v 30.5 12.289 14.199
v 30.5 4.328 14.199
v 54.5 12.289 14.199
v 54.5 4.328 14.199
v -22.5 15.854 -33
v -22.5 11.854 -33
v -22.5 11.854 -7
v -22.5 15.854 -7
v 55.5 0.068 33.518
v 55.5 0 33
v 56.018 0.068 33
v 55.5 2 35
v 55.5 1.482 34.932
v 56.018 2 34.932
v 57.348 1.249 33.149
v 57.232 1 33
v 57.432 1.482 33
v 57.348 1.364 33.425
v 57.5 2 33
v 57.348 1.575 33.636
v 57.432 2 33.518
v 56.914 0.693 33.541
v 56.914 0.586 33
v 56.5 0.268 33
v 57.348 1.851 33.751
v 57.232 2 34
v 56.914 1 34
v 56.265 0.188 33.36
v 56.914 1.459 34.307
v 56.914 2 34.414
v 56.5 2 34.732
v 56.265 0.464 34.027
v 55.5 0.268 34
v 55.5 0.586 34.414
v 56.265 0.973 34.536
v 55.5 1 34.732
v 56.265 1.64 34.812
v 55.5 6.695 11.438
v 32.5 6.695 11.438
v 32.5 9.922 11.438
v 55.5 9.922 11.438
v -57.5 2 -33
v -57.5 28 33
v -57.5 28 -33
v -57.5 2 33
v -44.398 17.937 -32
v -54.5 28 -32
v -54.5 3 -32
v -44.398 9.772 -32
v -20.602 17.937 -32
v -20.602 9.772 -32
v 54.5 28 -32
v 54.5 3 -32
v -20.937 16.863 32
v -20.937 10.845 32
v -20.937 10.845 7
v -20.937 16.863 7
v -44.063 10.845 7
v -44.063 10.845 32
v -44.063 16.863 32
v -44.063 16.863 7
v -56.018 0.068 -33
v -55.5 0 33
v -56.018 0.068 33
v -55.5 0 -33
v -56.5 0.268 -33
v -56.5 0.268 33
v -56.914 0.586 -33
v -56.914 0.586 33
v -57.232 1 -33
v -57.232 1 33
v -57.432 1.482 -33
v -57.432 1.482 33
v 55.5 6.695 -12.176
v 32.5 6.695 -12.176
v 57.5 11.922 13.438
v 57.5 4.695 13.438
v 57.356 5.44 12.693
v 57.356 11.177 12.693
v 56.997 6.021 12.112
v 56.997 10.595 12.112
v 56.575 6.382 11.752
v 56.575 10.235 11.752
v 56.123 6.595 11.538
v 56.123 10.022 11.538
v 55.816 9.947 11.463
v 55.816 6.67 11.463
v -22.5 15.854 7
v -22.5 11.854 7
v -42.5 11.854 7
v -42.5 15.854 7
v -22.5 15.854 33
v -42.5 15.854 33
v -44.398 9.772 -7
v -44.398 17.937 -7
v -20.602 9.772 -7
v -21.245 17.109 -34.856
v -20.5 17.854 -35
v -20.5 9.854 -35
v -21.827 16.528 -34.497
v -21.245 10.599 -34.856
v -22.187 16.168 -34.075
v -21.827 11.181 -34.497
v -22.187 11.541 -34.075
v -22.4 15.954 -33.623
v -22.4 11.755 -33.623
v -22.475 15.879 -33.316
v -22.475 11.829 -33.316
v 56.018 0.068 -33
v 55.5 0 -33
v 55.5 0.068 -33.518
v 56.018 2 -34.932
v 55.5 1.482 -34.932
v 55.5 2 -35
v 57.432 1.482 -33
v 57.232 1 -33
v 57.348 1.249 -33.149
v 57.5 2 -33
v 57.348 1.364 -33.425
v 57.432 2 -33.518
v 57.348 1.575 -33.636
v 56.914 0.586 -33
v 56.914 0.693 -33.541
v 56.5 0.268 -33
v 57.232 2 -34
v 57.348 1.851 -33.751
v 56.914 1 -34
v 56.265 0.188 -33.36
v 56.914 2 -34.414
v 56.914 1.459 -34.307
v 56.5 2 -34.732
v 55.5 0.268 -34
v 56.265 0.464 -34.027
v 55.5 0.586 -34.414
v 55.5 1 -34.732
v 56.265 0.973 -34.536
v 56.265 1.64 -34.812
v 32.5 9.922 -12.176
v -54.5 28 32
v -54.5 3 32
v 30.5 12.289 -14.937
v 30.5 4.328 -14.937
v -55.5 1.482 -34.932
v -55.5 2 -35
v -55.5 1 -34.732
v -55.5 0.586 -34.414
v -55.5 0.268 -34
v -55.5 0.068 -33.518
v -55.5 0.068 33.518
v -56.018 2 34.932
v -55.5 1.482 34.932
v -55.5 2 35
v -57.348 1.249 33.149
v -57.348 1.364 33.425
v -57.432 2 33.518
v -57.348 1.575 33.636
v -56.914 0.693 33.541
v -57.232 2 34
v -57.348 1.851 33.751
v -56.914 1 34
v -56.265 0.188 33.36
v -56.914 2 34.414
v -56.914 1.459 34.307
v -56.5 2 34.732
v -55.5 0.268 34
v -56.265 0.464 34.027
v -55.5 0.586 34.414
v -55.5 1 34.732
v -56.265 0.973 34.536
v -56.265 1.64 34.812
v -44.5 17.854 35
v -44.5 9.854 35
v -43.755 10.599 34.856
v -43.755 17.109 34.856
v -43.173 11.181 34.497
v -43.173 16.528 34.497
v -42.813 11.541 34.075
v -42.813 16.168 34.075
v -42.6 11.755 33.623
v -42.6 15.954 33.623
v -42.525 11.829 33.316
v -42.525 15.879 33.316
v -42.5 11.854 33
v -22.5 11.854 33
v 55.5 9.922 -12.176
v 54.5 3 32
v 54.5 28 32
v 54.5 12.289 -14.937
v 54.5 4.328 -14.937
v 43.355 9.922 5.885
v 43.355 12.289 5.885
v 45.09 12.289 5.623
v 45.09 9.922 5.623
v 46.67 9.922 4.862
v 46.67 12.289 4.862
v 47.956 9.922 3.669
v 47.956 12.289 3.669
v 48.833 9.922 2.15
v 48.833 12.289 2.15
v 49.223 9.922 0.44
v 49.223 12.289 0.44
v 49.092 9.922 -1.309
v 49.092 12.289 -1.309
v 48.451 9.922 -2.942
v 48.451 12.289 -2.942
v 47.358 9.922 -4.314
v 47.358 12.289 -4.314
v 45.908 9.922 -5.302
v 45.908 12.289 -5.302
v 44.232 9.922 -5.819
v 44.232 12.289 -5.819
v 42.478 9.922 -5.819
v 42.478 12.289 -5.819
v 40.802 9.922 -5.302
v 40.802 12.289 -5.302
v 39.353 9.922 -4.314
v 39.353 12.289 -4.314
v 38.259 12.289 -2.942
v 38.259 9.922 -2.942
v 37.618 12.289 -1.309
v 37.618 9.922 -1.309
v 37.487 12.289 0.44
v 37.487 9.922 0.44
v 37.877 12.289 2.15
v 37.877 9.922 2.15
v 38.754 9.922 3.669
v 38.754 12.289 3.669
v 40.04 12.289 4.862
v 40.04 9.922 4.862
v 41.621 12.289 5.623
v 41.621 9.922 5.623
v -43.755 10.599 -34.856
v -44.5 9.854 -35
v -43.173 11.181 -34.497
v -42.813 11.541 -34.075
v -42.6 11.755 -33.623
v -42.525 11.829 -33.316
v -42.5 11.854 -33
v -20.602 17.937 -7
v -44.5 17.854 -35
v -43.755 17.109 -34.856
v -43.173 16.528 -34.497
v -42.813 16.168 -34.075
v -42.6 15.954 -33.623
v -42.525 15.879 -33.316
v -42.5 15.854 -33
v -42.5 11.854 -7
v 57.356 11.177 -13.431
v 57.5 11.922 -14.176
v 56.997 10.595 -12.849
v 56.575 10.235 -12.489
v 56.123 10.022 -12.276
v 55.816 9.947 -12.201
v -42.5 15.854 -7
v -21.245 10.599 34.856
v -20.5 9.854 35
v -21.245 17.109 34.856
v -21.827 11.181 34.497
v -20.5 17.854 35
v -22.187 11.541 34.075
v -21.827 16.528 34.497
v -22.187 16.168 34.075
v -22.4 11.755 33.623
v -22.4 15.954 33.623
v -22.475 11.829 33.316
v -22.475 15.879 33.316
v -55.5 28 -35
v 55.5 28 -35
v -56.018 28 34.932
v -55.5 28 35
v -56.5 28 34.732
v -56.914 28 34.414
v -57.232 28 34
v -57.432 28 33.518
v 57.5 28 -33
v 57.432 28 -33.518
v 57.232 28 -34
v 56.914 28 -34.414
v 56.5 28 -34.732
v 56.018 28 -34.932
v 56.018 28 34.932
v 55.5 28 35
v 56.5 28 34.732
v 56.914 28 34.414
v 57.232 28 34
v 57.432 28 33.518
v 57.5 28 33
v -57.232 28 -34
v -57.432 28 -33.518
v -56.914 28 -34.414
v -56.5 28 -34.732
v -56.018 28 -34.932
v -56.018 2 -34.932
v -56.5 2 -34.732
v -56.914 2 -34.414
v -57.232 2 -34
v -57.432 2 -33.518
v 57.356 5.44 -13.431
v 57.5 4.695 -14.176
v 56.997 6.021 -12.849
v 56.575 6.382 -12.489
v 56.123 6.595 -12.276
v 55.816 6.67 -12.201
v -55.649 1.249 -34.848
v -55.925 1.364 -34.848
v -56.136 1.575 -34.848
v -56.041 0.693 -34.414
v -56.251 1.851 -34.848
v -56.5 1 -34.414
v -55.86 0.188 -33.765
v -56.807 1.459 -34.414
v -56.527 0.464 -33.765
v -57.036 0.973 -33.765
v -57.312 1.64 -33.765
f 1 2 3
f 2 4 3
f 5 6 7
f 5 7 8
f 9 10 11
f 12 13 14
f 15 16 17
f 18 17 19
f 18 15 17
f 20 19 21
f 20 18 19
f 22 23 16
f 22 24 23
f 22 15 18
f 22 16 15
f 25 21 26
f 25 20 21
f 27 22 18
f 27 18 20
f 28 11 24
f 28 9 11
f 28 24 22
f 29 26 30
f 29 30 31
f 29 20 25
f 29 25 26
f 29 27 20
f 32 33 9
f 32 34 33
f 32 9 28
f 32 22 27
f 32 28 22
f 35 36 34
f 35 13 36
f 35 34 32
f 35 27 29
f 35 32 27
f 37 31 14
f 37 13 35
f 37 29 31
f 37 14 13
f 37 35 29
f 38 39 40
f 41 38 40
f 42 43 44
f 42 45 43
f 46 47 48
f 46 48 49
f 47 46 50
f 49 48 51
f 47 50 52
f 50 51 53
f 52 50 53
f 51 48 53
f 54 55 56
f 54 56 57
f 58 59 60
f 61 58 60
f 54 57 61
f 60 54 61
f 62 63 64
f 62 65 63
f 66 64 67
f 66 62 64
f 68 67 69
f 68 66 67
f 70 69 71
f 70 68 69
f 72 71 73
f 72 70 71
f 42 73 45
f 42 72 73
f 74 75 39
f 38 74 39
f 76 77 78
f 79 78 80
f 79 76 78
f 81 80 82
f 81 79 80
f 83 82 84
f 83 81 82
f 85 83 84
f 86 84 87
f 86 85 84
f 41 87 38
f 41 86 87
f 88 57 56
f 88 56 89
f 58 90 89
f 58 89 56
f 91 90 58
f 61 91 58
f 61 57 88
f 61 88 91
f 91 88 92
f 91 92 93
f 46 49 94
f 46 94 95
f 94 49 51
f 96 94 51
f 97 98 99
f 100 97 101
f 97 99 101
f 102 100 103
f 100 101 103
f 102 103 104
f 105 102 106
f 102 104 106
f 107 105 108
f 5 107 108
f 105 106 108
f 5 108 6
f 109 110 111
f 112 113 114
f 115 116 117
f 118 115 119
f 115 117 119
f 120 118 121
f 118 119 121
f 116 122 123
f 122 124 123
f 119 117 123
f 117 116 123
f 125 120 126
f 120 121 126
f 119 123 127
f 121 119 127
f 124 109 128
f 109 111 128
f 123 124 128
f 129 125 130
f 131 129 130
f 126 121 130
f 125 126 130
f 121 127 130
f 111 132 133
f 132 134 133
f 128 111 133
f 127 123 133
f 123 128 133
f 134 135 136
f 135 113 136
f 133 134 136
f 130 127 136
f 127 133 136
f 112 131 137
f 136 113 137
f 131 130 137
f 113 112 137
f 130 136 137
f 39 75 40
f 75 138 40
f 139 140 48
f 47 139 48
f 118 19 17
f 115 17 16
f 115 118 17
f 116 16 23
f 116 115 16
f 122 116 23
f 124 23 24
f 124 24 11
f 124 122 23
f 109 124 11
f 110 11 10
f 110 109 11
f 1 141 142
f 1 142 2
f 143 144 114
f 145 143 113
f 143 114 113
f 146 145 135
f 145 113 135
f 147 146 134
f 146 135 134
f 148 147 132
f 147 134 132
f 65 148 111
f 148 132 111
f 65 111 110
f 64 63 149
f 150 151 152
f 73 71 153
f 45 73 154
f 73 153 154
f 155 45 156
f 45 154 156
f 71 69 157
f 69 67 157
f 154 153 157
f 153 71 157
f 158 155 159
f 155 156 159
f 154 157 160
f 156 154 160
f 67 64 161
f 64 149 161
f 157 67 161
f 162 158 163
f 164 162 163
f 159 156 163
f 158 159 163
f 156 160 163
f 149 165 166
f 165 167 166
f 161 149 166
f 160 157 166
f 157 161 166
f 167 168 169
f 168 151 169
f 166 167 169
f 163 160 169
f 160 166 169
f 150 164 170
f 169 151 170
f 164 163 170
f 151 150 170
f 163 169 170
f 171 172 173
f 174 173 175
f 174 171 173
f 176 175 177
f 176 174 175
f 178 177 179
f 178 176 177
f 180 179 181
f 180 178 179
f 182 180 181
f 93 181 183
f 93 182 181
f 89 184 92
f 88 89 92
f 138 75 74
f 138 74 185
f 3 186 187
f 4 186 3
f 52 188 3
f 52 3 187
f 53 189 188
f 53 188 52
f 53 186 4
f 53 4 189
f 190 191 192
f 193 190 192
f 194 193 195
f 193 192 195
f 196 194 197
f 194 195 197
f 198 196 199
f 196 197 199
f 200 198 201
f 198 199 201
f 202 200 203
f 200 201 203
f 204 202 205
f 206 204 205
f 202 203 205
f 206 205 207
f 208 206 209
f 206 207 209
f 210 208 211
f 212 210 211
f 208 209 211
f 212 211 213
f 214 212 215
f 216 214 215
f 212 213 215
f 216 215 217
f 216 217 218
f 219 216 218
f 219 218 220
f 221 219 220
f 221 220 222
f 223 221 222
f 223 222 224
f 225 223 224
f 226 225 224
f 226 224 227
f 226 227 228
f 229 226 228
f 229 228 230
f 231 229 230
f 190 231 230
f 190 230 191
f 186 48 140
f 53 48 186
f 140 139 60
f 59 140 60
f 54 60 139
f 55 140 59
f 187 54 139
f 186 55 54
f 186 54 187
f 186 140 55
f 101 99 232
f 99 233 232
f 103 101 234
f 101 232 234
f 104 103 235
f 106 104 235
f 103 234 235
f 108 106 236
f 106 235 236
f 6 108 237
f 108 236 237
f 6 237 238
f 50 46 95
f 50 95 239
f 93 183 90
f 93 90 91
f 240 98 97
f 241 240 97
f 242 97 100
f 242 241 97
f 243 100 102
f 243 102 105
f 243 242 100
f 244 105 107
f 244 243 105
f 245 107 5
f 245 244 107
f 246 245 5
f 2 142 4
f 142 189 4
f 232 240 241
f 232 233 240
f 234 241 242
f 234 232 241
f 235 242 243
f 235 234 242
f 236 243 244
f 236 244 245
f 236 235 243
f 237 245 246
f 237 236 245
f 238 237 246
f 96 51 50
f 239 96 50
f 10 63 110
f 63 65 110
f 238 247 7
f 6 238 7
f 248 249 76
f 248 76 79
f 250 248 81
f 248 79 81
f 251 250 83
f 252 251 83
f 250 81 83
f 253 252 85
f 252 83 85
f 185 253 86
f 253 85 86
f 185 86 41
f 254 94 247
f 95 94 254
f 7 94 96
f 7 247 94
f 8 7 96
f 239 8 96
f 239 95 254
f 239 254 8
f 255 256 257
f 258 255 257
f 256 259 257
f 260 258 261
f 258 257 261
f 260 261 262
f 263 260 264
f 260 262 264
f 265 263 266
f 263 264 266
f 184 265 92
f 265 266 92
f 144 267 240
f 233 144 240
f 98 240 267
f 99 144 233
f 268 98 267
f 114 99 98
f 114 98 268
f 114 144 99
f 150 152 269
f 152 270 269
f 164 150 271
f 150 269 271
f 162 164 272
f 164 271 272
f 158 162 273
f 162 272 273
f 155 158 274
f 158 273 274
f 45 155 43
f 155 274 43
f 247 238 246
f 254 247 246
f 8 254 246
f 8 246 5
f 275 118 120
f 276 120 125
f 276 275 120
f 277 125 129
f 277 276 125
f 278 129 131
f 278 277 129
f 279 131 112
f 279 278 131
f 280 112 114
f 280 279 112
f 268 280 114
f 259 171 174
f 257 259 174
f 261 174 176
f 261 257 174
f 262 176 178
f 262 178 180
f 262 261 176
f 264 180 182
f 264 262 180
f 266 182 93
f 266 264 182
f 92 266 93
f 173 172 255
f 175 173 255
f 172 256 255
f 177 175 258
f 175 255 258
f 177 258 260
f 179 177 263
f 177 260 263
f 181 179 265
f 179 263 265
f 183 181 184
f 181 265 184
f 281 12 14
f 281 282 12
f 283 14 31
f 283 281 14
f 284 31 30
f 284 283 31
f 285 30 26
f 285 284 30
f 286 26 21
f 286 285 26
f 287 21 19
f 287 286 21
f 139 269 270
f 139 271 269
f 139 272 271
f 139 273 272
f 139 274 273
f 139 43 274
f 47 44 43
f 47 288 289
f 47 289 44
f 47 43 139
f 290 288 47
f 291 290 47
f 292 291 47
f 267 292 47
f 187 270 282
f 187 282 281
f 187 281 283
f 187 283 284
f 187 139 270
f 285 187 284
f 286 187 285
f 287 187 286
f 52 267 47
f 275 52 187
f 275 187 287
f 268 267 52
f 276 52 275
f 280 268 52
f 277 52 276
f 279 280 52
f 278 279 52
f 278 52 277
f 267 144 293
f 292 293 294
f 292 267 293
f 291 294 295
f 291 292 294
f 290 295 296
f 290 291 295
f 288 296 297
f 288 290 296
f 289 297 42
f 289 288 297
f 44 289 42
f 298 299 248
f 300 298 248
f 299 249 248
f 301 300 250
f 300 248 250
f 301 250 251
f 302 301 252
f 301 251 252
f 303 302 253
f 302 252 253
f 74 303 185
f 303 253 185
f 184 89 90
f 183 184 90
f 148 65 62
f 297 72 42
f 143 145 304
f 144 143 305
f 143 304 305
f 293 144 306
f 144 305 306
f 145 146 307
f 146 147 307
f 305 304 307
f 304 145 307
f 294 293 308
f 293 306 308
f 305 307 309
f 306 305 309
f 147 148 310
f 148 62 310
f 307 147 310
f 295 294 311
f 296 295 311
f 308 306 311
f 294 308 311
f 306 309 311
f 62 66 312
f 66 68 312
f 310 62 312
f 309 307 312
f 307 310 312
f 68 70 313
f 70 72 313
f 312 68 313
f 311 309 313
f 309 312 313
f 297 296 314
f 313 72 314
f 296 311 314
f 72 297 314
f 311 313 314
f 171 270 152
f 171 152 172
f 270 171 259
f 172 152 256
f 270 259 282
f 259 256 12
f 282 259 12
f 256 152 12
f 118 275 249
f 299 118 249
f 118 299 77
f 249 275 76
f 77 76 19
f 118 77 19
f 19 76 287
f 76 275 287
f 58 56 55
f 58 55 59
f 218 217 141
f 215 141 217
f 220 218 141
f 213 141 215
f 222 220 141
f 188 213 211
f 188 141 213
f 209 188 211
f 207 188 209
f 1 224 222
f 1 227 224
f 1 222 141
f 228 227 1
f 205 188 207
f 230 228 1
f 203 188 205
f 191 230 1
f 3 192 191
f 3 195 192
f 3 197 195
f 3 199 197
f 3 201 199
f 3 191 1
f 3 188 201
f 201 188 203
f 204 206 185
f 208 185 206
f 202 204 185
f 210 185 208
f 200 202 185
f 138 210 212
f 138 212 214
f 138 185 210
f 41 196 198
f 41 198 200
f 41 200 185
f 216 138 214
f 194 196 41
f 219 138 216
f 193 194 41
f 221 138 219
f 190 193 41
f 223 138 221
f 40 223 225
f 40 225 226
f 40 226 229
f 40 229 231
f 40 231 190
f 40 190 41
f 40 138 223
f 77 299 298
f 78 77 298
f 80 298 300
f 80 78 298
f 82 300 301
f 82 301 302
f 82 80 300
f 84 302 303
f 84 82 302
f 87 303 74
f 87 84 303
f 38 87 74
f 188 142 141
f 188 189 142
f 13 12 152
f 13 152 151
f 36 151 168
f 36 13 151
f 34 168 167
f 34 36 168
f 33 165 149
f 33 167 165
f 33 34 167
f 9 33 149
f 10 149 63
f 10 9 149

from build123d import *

# Parameters (mm, degrees)
SKETCH1_W           = 115
SKETCH1_H           = 70
BOSS_EXTRUDE1_DEPTH = 28
SHELL2_T            = -3
SKETCH2_W           = 20
SKETCH2_H           = 4
CUT_EXTRUDE1_DEPTH  = 95.816928868
SKETCH4_W           = 23.796796
SKETCH4_H           = 8.165514589
SKETCH4_W_2         = 20
SKETCH4_H_2         = 4
BOSS_EXTRUDE2_DEPTH = 25
SKETCH5_W           = 23.125103044
SKETCH5_H           = 6.017817829
SKETCH5_W_2         = 20
SKETCH5_H_2         = 4
BOSS_EXTRUDE3_DEPTH = 25
FILLET2_R           = 2
FILLET3_R           = 2
SKETCH9_W           = 29.136235749
SKETCH9_H           = 7.961178331
BOSS_EXTRUDE4_DEPTH = 25
SKETCH11_W          = 23.614359243
SKETCH11_H          = 3.227216001
CUT_EXTRUDE4_DEPTH  = 101.543522914
FILLET4_R           = 2
CUT_EXTRUDE5_REACH  = 71.124
SKETCH12_R          = 5.884599132
SKETCH13_W          = 29.136235749
SKETCH13_H          = 7.961178331
BOSS_EXTRUDE5_DEPTH = 2


with BuildPart() as part:
    # Sketch1 → Boss-Extrude1 (new body)
    with BuildSketch(Plane(origin=(0, 0, 0), x_dir=(1, 0, 0), z_dir=(0, 1, 0))):
        Rectangle(SKETCH1_W, SKETCH1_H)
    extrude(amount=BOSS_EXTRUDE1_DEPTH)

    # Shell2
    shell2_openings = [part.faces().sort_by_distance(p)[0] for p in [
        (0, 28, 0),
    ]]
    offset(amount=SHELL2_T, openings=shell2_openings, kind=Kind.INTERSECTION)

    # Sketch2 → Cut-Extrude1 (cut, through all)
    with BuildSketch(Plane.XY.offset(35)):
        with Locations((-32.5, 13.8542792)):
            Rectangle(SKETCH2_W, SKETCH2_H)
    extrude(amount=-CUT_EXTRUDE1_DEPTH, mode=Mode.SUBTRACT)

    # Sketch4 → Boss-Extrude2 (add)
    with BuildSketch(Plane.XY.offset(-32)):
        with Locations((-32.5, 13.854279201)):
            Rectangle(SKETCH4_W, SKETCH4_H)
        with Locations((-32.5, 13.8542792)):
            Rectangle(SKETCH4_W_2, SKETCH4_H_2, mode=Mode.SUBTRACT)
    extrude(amount=BOSS_EXTRUDE2_DEPTH)

    # Sketch5 → Boss-Extrude3 (add)
    with BuildSketch(Plane(origin=(0, 0, 32), x_dir=(-1, 0, 0), z_dir=(0, 0, -1))):
        with Locations((32.5, 13.854279201)):
            Rectangle(SKETCH5_W, SKETCH5_H)
        with Locations((32.5, 13.8542792)):
            Rectangle(SKETCH5_W_2, SKETCH5_H_2, mode=Mode.SUBTRACT)
    extrude(amount=BOSS_EXTRUDE3_DEPTH)

    # Fillet2
    fillet2_edges = [part.edges().sort_by_distance(p)[0] for p in [
        (0, 0, 35),
        (-57.5, 0, 0),
        (0, 0, -35),
        (57.5, 0, 0),
        (57.5, 14, 35),
        (-57.5, 14, 35),
        (-57.5, 14, -35),
        (57.5, 14, -35),
    ]]
    fillet(fillet2_edges, radius=FILLET2_R)

    # Fillet3
    fillet3_edges = [part.edges().sort_by_distance(p)[0] for p in [
        (-42.5, 13.8542792, -35),
        (-32.5, 15.8542792, -35),
        (-22.5, 13.8542792, -35),
        (-32.5, 11.8542792, -35),
        (-42.5, 13.8542792, 35),
        (-32.5, 11.8542792, 35),
        (-22.5, 13.8542792, 35),
        (-32.5, 15.8542792, 35),
    ]]
    fillet(fillet3_edges, radius=FILLET3_R)

    # Sketch9 → Boss-Extrude4 (add)
    with BuildSketch(Plane.ZY.offset(-57.5)):
        with Locations((-0.368841187, 8.308427345)):
            Rectangle(SKETCH9_W, SKETCH9_H)
    extrude(amount=BOSS_EXTRUDE4_DEPTH)

    # Sketch11 → Cut-Extrude4 (cut, through all)
    with BuildSketch(Plane.ZY.offset(-32.5)):
        with Locations((-0.368841187, 8.308427345)):
            Rectangle(SKETCH11_W, SKETCH11_H)
    extrude(amount=-CUT_EXTRUDE4_DEPTH, mode=Mode.SUBTRACT)

    # Fillet4
    fillet4_edges = [part.edges().sort_by_distance(p)[0] for p in [
        (57.5, 8.308427345, 11.438338435),
        (57.5, 6.694819344, -0.368841187),
        (57.5, 8.308427345, -12.176020808),
        (57.5, 9.922035345, -0.368841187),
    ]]
    fillet(fillet4_edges, radius=FILLET4_R)

    # Sketch12 → Cut-Extrude5 (cut, up to next)
    with BuildSketch(Plane(origin=(0, 12.28901651, 0), x_dir=(1, 0, 0), z_dir=(0, 1, 0)), mode=Mode.PRIVATE) as cut_extrude5_sk1:
        with Locations(Location((43.35506163, 0, 0), (0, 0, 270))):
            Circle(SKETCH12_R)
    cut_extrude5_tool1 = extrude(cut_extrude5_sk1.sketch, amount=-CUT_EXTRUDE5_REACH, mode=Mode.PRIVATE) & part.part
    add(cut_extrude5_tool1.solids().sort_by_distance((43.355062, 12.289017, 0))[0], mode=Mode.SUBTRACT)

    # Sketch13 → Boss-Extrude5 (add)
    with BuildSketch(Plane.ZY.offset(-32.5)):
        with Locations((-0.368841187, 8.308427345)):
            Rectangle(SKETCH13_W, SKETCH13_H)
    extrude(amount=BOSS_EXTRUDE5_DEPTH)


solid = part.part
